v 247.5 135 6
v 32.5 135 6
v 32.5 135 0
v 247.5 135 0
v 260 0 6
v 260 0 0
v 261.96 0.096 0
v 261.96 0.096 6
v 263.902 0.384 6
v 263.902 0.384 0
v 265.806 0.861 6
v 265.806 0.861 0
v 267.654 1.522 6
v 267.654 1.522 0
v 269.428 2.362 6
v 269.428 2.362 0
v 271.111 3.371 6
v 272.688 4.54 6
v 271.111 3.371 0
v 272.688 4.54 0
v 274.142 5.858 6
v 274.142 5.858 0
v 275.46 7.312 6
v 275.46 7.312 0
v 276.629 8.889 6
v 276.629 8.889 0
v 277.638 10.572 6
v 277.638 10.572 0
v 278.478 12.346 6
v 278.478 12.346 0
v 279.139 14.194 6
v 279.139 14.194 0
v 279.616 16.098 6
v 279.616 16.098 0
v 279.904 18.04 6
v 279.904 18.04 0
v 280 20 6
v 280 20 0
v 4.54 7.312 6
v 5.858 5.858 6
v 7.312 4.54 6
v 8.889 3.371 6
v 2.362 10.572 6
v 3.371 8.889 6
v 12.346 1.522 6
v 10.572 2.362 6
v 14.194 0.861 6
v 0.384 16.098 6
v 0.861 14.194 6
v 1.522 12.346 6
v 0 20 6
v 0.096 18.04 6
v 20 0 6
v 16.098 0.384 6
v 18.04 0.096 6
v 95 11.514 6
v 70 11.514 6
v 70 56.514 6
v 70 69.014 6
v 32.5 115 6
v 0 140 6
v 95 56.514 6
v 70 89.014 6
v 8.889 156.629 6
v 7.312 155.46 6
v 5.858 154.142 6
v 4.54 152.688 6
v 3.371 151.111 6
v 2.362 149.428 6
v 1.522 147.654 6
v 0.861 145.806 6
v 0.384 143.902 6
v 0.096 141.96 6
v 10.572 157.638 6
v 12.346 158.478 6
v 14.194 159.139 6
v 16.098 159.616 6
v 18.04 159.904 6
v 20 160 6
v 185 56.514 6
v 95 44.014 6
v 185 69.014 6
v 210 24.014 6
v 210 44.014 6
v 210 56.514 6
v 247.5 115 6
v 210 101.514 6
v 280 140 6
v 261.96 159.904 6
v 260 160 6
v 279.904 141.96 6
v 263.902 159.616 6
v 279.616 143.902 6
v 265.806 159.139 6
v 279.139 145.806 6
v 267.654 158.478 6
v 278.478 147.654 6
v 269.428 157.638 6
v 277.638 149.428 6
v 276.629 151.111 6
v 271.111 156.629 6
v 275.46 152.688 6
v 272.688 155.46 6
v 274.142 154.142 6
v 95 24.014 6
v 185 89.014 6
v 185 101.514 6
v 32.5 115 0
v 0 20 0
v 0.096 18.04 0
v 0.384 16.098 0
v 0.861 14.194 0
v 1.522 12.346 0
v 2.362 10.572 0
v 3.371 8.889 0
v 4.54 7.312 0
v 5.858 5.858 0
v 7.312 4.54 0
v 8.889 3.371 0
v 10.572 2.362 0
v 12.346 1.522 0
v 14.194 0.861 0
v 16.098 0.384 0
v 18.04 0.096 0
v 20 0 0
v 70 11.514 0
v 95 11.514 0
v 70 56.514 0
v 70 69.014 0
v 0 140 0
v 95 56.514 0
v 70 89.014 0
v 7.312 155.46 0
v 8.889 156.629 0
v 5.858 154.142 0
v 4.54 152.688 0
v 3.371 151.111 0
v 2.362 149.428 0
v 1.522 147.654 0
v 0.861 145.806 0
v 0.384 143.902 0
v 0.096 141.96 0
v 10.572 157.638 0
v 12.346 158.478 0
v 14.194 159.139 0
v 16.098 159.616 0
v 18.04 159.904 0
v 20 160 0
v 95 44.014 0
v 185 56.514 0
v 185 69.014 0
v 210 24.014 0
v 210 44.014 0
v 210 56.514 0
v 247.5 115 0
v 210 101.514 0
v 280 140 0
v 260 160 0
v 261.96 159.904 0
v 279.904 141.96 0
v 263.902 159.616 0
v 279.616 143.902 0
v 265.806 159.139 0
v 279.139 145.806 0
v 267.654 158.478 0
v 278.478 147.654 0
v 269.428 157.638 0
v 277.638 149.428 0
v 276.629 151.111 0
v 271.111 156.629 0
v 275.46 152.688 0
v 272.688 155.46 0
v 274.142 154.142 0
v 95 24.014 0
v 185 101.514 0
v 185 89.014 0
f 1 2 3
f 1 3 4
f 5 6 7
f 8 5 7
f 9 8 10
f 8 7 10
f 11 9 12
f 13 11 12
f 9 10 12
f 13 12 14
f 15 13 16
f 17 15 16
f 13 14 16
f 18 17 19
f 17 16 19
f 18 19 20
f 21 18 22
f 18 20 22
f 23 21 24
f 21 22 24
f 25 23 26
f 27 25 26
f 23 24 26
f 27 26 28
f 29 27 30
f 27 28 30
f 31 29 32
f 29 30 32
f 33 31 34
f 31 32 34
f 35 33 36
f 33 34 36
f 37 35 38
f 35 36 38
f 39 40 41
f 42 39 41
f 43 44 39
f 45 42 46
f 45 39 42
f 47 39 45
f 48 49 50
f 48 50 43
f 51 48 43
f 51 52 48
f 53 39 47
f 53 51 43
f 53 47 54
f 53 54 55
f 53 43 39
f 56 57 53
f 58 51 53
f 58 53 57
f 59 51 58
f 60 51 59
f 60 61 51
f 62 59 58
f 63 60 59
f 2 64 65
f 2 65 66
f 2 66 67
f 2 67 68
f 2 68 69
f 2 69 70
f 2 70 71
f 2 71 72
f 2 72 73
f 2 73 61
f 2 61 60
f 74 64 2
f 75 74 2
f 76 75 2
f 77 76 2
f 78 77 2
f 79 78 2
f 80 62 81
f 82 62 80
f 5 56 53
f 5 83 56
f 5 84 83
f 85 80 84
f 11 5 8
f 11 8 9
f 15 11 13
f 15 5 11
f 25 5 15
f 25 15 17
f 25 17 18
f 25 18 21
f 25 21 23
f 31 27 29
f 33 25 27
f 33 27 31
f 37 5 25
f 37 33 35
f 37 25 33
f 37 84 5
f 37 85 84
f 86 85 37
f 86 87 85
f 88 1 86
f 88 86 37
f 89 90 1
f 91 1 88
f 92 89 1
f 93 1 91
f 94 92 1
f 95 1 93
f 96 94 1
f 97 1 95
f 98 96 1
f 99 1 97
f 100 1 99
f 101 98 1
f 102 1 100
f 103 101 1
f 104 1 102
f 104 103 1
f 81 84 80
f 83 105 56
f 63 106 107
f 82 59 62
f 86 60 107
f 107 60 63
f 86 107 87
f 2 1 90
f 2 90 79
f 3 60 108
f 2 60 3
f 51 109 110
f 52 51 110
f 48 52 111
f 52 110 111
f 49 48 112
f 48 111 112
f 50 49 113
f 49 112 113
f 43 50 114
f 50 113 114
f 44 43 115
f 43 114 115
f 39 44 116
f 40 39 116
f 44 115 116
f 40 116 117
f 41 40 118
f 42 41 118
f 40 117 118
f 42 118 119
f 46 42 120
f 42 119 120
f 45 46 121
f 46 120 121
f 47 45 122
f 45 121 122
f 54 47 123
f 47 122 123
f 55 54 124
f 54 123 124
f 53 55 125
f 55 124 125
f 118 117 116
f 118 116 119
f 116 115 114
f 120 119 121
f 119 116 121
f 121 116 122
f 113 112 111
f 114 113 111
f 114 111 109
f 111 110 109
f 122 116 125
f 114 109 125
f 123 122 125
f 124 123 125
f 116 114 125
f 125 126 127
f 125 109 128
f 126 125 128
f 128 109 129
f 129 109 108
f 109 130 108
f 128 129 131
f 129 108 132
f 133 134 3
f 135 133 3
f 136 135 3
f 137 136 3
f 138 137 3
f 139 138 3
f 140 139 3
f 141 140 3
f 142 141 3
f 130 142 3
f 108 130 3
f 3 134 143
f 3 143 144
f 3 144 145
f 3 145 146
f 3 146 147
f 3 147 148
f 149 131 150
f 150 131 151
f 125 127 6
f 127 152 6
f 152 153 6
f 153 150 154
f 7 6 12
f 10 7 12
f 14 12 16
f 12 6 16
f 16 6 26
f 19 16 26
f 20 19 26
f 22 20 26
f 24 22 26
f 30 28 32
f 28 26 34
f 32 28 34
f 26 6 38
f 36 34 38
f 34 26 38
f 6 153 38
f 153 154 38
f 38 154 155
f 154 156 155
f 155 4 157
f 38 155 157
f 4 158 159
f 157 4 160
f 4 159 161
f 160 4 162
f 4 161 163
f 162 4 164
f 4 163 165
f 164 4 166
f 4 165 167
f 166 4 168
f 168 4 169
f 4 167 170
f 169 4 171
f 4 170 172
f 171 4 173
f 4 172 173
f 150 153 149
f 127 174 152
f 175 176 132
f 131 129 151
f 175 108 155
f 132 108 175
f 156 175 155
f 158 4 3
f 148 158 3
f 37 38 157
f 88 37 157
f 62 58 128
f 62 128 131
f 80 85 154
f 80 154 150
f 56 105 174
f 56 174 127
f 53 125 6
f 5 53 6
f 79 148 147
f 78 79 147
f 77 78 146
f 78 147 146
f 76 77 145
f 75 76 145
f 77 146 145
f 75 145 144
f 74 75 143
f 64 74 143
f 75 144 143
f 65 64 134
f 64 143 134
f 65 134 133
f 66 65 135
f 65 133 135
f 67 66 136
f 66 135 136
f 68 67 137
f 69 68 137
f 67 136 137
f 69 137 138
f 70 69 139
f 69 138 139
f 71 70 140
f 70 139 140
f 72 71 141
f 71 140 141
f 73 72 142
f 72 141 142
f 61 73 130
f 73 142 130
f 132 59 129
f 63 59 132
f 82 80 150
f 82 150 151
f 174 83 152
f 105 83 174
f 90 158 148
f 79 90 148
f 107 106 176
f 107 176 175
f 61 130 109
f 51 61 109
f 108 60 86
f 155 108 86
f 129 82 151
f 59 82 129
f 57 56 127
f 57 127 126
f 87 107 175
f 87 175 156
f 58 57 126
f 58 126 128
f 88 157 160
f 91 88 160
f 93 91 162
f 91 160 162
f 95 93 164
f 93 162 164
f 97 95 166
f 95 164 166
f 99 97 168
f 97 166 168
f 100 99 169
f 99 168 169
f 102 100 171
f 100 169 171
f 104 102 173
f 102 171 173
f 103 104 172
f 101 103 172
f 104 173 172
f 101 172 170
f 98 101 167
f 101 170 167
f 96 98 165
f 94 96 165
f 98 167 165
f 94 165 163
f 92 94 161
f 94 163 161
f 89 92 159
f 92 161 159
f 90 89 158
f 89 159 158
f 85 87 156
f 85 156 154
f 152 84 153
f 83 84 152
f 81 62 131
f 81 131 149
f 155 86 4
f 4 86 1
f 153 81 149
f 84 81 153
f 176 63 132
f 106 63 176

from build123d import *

# Parameters (mm, degrees)
BOSS_EXTRUDE1_DEPTH = 6
SKETCH2_W           = 215
SKETCH2_H           = 20
CUT_EXTRUDE1_DEPTH  = 6


with BuildPart() as part:
    # Sketch1 → Boss-Extrude1 (new body)
    with BuildSketch(Plane.XY):
        with BuildLine():
            Line((20, 0), (260, 0))
            ThreePointArc((260, 0), (274.142135624, 5.857864376), (280, 20))
            Line((280, 20), (280, 140))
            ThreePointArc((280, 140), (274.142135624, 154.142135624), (260, 160))
            Line((260, 160), (20, 160))
            ThreePointArc((20, 160), (5.857864376, 154.142135624), (0, 140))
            Line((0, 140), (0, 20))
            ThreePointArc((0, 20), (5.857864376, 5.857864376), (20, 0))
        make_face()
    extrude(amount=BOSS_EXTRUDE1_DEPTH)

    # Sketch2 → Cut-Extrude1 (cut)
    with BuildSketch(Plane.XY.offset(6)):
        with Locations((140, 125)):
            Rectangle(SKETCH2_W, SKETCH2_H)
        Polygon((70, 89.013901834), (185, 89.013901834), (185, 101.513901834), (210, 101.513901834), (210, 56.513901834), (185, 56.513901834), (185, 69.013901834), (70, 69.013901834), align=None)
        Polygon((95, 56.513901834), (95, 44.013901834), (210, 44.013901834), (210, 24.013901834), (95, 24.013901834), (95, 11.513901834), (70, 11.513901834), (70, 56.513901834), align=None)
    extrude(amount=-CUT_EXTRUDE1_DEPTH, mode=Mode.SUBTRACT)


solid = part.part
